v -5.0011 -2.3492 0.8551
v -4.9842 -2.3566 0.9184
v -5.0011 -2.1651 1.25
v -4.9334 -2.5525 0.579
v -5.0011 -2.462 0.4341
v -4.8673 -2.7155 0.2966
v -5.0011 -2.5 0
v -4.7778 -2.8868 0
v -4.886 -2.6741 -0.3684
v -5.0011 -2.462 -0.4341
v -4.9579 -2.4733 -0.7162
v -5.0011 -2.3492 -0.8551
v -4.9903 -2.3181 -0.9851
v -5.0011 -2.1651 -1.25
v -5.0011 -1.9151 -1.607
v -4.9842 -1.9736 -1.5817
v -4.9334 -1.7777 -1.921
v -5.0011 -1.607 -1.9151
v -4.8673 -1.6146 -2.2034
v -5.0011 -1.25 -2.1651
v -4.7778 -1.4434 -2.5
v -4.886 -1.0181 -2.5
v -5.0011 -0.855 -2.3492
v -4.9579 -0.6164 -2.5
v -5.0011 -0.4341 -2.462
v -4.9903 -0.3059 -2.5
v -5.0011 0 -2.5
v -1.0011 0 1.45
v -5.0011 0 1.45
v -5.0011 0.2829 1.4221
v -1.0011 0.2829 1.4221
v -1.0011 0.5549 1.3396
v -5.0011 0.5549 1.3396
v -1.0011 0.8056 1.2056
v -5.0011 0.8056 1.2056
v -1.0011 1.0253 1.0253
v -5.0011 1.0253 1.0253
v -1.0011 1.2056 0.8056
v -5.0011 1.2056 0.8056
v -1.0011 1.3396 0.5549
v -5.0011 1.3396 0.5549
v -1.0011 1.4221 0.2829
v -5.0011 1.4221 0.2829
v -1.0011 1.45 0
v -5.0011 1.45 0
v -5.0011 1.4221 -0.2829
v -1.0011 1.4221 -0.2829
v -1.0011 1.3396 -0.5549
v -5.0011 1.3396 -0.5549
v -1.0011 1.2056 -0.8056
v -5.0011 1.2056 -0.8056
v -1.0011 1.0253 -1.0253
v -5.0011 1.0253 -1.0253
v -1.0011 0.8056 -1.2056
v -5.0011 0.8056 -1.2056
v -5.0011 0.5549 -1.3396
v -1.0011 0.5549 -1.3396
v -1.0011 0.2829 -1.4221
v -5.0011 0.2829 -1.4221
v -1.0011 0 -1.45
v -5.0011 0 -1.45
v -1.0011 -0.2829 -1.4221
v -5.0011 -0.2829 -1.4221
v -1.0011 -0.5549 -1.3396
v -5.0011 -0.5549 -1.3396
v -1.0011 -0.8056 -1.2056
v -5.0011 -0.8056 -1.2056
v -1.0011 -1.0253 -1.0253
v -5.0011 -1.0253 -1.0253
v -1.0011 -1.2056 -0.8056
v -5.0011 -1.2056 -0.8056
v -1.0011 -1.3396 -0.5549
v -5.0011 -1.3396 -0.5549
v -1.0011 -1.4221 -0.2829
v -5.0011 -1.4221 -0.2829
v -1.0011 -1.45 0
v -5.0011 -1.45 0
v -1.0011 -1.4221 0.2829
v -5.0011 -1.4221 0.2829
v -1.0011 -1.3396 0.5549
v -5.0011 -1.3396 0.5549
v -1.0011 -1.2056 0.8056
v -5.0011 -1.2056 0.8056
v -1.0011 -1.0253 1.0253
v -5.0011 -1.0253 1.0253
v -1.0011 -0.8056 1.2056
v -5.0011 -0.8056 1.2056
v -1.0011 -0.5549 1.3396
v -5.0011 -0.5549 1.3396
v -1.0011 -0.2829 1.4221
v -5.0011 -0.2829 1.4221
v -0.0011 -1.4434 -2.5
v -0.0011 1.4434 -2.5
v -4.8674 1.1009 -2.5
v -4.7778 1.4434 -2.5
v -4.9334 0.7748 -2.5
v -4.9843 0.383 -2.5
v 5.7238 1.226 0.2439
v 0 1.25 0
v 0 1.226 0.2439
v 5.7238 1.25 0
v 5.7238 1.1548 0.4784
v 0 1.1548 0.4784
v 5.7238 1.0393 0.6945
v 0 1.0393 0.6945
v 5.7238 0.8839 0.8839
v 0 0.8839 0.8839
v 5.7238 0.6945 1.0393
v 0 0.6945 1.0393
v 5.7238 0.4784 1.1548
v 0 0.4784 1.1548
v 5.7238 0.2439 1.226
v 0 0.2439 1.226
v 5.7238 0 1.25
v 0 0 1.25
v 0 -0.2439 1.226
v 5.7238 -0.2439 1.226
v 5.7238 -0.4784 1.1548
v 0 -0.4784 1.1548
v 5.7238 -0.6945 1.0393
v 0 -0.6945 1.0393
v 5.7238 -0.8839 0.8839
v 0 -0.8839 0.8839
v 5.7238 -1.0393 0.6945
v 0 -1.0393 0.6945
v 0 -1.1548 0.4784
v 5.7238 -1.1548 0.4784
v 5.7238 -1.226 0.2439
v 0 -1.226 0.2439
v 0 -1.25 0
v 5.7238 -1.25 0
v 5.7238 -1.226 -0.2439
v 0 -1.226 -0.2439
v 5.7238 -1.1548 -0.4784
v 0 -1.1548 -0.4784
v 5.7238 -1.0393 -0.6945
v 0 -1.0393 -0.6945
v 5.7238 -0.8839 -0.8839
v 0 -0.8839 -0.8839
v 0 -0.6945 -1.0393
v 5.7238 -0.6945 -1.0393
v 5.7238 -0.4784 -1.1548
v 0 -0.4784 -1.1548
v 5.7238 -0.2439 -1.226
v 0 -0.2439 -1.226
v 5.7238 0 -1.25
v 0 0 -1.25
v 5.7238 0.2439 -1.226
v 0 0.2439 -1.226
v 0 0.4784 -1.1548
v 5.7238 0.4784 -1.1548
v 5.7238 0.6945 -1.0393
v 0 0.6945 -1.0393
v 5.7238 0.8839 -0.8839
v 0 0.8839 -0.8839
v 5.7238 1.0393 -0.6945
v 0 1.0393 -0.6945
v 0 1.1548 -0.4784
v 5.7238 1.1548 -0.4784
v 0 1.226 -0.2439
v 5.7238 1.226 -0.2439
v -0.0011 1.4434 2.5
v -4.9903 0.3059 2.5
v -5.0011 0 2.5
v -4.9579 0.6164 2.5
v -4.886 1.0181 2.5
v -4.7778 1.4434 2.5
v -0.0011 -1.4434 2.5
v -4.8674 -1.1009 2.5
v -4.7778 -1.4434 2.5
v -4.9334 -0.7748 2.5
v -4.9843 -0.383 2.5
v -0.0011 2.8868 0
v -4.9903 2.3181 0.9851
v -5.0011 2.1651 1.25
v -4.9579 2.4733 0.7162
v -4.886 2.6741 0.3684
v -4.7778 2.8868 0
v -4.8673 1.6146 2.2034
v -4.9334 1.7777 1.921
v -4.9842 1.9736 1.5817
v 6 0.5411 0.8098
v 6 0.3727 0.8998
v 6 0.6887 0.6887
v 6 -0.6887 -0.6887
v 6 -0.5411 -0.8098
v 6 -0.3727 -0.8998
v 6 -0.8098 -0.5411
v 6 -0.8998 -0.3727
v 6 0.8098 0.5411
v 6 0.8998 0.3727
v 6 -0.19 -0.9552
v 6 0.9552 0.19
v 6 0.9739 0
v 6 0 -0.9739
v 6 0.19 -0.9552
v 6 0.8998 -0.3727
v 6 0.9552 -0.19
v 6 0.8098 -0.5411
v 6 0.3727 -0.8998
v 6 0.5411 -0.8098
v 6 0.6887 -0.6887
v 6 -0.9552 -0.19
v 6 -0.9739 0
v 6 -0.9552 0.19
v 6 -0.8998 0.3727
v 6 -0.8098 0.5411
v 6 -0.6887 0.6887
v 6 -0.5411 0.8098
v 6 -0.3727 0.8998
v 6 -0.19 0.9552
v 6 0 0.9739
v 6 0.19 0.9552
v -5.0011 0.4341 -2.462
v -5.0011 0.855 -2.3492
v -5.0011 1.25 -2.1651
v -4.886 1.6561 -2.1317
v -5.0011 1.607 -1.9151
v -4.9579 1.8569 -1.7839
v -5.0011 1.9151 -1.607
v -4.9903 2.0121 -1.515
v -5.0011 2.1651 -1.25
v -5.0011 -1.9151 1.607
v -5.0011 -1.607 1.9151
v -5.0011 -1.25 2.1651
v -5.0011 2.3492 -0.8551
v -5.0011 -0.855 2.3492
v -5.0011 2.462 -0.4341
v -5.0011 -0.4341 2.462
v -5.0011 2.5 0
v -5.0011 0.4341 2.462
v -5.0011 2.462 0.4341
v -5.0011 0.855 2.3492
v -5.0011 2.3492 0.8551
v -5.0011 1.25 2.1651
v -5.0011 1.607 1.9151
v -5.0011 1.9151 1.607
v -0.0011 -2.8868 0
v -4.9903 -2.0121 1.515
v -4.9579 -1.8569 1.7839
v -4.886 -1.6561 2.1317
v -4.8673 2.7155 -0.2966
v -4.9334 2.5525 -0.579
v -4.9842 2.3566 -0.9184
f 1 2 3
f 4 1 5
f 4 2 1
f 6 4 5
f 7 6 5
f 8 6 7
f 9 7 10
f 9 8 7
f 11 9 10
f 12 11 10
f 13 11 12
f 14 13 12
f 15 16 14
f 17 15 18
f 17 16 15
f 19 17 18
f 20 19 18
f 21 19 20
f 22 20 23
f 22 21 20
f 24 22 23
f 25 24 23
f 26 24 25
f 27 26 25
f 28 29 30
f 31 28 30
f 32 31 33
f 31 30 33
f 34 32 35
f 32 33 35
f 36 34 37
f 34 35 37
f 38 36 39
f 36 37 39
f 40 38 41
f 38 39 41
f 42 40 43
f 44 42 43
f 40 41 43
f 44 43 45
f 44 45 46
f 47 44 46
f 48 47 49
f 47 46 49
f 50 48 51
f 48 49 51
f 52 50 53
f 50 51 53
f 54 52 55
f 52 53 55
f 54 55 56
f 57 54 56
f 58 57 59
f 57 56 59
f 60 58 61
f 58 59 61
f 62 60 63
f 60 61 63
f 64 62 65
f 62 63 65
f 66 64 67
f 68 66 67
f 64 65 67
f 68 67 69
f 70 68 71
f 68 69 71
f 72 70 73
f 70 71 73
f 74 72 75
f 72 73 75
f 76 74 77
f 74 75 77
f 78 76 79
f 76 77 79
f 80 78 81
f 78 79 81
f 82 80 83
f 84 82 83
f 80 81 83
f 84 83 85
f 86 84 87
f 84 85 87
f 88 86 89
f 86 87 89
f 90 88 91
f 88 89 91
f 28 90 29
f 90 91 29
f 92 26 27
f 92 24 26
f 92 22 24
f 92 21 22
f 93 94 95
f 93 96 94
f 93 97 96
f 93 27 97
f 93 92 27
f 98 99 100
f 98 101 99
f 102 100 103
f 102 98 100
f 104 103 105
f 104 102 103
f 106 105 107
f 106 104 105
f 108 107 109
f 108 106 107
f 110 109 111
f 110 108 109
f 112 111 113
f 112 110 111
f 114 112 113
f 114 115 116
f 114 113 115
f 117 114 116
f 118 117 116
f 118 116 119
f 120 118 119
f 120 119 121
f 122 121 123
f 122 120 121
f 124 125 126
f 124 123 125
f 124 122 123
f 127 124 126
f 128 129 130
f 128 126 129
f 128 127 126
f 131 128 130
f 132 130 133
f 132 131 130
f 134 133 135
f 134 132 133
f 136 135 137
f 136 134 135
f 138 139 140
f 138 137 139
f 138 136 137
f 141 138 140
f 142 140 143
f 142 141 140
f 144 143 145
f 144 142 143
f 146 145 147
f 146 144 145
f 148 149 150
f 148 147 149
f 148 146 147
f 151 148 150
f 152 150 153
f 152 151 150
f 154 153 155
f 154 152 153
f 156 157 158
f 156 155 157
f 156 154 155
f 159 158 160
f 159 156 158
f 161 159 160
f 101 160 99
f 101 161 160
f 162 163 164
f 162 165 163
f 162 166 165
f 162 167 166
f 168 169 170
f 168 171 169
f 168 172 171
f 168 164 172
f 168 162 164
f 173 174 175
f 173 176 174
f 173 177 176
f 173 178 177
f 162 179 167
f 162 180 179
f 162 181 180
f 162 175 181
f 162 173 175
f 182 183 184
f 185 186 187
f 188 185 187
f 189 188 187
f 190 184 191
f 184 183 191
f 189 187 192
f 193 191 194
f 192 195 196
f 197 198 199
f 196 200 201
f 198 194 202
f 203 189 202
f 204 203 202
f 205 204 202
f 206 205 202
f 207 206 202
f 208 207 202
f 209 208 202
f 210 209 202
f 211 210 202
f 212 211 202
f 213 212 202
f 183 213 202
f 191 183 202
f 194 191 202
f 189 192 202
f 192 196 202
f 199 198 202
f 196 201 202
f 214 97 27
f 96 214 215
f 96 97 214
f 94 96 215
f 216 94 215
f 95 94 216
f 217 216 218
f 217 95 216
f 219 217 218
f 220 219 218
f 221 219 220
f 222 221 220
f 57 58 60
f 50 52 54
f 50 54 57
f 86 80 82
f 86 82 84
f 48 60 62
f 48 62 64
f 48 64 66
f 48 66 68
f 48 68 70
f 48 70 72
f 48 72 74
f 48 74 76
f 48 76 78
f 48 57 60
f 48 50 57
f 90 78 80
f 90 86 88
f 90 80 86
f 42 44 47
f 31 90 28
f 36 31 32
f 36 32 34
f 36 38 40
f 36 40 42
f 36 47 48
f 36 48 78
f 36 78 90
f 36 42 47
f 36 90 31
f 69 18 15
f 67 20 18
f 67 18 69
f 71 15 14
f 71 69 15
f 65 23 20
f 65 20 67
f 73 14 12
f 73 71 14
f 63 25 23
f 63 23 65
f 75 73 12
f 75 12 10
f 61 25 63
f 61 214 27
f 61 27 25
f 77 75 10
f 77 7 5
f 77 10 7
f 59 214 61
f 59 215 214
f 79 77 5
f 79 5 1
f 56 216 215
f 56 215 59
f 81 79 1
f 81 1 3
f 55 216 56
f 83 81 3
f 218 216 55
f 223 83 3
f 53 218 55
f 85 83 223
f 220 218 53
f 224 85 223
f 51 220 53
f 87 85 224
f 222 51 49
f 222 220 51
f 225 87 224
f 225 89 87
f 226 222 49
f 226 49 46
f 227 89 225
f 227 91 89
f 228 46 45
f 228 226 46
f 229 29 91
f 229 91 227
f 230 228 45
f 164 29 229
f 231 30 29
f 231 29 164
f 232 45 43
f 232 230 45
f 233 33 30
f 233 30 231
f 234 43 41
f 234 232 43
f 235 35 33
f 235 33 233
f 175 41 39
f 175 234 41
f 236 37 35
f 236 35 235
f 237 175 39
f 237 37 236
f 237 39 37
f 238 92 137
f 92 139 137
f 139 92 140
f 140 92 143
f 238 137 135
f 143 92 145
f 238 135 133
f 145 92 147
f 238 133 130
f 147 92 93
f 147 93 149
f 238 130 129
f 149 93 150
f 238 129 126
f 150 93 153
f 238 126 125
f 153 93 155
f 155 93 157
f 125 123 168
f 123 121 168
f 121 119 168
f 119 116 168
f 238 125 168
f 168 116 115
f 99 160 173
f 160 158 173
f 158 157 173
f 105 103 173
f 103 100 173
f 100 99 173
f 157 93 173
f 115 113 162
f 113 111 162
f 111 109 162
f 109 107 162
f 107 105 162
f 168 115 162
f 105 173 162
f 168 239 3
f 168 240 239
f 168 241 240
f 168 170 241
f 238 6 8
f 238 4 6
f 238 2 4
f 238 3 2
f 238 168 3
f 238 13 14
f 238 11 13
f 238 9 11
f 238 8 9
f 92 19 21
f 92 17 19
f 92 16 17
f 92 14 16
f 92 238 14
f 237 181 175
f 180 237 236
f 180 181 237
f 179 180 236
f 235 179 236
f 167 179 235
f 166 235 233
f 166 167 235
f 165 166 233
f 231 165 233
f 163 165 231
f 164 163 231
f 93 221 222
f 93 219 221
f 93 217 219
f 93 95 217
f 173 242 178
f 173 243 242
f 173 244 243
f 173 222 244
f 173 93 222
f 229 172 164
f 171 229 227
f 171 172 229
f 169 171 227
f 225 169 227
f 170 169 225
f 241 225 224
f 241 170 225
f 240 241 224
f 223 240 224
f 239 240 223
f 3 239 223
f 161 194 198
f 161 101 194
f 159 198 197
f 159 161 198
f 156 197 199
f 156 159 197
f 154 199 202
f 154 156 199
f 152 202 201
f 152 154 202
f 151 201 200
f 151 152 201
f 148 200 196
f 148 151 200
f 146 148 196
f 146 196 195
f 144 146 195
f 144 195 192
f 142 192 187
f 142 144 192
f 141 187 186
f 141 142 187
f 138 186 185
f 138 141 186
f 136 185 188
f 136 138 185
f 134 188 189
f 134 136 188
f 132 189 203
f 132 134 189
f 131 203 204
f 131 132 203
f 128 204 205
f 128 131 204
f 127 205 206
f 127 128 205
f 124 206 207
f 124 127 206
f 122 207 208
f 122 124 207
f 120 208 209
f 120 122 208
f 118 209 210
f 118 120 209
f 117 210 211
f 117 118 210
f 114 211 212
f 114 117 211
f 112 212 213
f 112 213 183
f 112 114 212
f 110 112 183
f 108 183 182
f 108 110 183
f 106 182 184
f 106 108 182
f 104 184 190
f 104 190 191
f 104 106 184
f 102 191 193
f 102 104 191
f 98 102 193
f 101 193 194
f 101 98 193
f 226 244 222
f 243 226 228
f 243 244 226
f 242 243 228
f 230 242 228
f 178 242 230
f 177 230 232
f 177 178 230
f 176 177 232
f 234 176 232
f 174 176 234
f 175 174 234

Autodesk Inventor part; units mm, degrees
ref_plane "YZ Plane" through (0, 0, 0) normal (1, 0, 0) x (0, 1, 0)
ref_plane "XZ Plane" through (0, 0, 0) normal (0, 1, 0) x (-1, 0, 0)
sketch "Sketch1" plane through (0, 0, 0) normal (0, 0, 1) x (1, 0, 0)
  line L0 (0, 2.5) -> (0, 1.25)
  line L1 (1.3, 1.25) -> (6, 1.25)
  line L2 (6, 1.25) -> (6, 0)
  line L3 (6, 0) -> (-0.0011, 0)
  line L4 (-1.2013, 0) -> (7.2002, 0) projected
  line L5 (-0.0011, 0) -> (-0.0011, 2.5)
  line L6 (-0.0011, 2.5) -> (0, 2.5)
  line L7 (1.3, 1.25) -> (1.0238, 1.25)
  line L8 (1.0238, 1.25) -> (0, 1.25)
  line L9 (0, -0.5) -> (0, 3) projected
  dimension "d0" = 6
  dimension "d1" = 4.7
  dimension "d2" = 2.5
  dimension "d9" = 0.0011
  dimension "d10" = 5
  dimension "d13" = 0.2762
  dimension "d14" = 2.5
revolve "Body" add sketch "Sketch1" angle 360 about axis through (6, 0, 0) along (-1, 0, 0)
sketch "Sketch2" plane through (-0.0011, 0, 0) normal (-1, 0, 0) x (0, 0, 1)
  line L0 (0, 2.8868) -> (2.5, 1.4434)
  line L1 (2.5, 1.4434) -> (2.5, -1.4434)
  line L2 (2.5, -1.4434) -> (0, -2.8868)
  line L3 (0, -2.8868) -> (-2.5, -1.4434)
  line L4 (-2.5, -1.4434) -> (-2.5, 1.4434)
  line L5 (-2.5, 1.4434) -> (0, 2.8868)
  point P0 (0, 0)
  point P1 (0, 0)
  dimension "d11" = 5
extrude "Head" add sketch "Sketch2" along normal blind 5
sketch "Sketch4" plane through (0, 0, 0) normal (0, 0, 1) x (1, 0, 0)
  line L0 (-5.0011, 2.5) -> (-5.0011, 2.8868)
  line L1 (-5.0011, 2.8868) -> (-4.7778, 2.8868)
  line L2 (-4.7778, 2.8868) -> (-5.0011, 2.5)
  line L3 (-2.0399, 0) -> (0.3387, 0) projected
  line L4 (-0.0011, 2.8868) -> (-5.0011, 2.8868) projected
  line L5 (-5.0011, 1.4434) -> (-5.0011, 2.8868) projected
  line L6 (-0.0011, -2.8868) -> (-5.0011, -2.8868) projected
  line L7 (-0.0011, 2.1651) -> (-0.0011, 2.8868) projected
  line L8 (-0.0011, 2.8868) -> (-0.2244, 2.8868)
  dimension "d5" = 30
  dimension "d19" = 5
revolve "Chamfer1" cut sketch "Sketch4" angle 360 about axis through (-10, 0, 0) along (1, 0, 0)
thread "Thread" size "M2.5x0.45" class "6g" standard "ISO Metric profile" length 4.7
chamfer "Chamfer2" distance 0.2761 distance2 0.2762 1 edges at (6, -1.25, 0) measured on face at (6, -0.3871, 0.3429)
ref_plane "Work Plane1" through (1.525, 0, 0) normal (0, 0, 1) x (1, 0, 0)
sketch "Sketch7" plane through (-5.0011, 0, 0) normal (-1, 0, 0) x (0, 0, 1)
  circle A0 centre (0, 0) radius 1.45
  point P0 (0, 0)
  dimension "d59" = 2.9
extrude "Extrusion5" cut sketch "Sketch7" against normal blind 4
equation "\"d11\" = SW"
equation "\"d15\" = GEL"
equation "\"d6\" = -0.5 * SPD + 0.5 * GD"
equation "\"d0\" = NLG"
equation "\"d1\" = GEL"
equation "\"d2\" = GD"
equation "\"d10\" = SD2"
equation "\"d14\" = BDM"
equation "\"d5\" = ANG1"
equation "\"d19\" = SW0"
equation "\"NLG\" = 6"
equation "\"GD\" = NND"
equation "\"BDM\" = NND"
equation "\"KOH\" = 1.7"
equation "\"GEL\" = 4.7"
equation "\"SW\" = 5"
equation "\"SW0\" = SW"
equation "\"SPD\" = NND - 1.2269 * PTC"
equation "\"SD2\" = SW"
equation "\"SD\" = 0.001"
equation "\"ANG1\" = 30deg"
equation "\"GAL\" = 0.61345 * PTC"
equation "\"GUL\" = 0.61345 * PTC"
equation "\"RR\" = 0.001"
equation "\"WFT\" = SD"
equation "\"GD1\" = THREADDIA - 1.2269 * PTC"
equation "\"THREADDIA\" = 2.5"
equation "\"SDH\" = SW"
equation "\"TOA\" = 30deg"
equation "\"FAWI\" = 45deg"
equation "\"PTC\" = 0.45"
equation "\"NND\" = 2.5"
equation "\"E0\" = 1.155 * SW"
properties part number "AS 1110 - M2.5 x 6" material "Steel, Mild"
